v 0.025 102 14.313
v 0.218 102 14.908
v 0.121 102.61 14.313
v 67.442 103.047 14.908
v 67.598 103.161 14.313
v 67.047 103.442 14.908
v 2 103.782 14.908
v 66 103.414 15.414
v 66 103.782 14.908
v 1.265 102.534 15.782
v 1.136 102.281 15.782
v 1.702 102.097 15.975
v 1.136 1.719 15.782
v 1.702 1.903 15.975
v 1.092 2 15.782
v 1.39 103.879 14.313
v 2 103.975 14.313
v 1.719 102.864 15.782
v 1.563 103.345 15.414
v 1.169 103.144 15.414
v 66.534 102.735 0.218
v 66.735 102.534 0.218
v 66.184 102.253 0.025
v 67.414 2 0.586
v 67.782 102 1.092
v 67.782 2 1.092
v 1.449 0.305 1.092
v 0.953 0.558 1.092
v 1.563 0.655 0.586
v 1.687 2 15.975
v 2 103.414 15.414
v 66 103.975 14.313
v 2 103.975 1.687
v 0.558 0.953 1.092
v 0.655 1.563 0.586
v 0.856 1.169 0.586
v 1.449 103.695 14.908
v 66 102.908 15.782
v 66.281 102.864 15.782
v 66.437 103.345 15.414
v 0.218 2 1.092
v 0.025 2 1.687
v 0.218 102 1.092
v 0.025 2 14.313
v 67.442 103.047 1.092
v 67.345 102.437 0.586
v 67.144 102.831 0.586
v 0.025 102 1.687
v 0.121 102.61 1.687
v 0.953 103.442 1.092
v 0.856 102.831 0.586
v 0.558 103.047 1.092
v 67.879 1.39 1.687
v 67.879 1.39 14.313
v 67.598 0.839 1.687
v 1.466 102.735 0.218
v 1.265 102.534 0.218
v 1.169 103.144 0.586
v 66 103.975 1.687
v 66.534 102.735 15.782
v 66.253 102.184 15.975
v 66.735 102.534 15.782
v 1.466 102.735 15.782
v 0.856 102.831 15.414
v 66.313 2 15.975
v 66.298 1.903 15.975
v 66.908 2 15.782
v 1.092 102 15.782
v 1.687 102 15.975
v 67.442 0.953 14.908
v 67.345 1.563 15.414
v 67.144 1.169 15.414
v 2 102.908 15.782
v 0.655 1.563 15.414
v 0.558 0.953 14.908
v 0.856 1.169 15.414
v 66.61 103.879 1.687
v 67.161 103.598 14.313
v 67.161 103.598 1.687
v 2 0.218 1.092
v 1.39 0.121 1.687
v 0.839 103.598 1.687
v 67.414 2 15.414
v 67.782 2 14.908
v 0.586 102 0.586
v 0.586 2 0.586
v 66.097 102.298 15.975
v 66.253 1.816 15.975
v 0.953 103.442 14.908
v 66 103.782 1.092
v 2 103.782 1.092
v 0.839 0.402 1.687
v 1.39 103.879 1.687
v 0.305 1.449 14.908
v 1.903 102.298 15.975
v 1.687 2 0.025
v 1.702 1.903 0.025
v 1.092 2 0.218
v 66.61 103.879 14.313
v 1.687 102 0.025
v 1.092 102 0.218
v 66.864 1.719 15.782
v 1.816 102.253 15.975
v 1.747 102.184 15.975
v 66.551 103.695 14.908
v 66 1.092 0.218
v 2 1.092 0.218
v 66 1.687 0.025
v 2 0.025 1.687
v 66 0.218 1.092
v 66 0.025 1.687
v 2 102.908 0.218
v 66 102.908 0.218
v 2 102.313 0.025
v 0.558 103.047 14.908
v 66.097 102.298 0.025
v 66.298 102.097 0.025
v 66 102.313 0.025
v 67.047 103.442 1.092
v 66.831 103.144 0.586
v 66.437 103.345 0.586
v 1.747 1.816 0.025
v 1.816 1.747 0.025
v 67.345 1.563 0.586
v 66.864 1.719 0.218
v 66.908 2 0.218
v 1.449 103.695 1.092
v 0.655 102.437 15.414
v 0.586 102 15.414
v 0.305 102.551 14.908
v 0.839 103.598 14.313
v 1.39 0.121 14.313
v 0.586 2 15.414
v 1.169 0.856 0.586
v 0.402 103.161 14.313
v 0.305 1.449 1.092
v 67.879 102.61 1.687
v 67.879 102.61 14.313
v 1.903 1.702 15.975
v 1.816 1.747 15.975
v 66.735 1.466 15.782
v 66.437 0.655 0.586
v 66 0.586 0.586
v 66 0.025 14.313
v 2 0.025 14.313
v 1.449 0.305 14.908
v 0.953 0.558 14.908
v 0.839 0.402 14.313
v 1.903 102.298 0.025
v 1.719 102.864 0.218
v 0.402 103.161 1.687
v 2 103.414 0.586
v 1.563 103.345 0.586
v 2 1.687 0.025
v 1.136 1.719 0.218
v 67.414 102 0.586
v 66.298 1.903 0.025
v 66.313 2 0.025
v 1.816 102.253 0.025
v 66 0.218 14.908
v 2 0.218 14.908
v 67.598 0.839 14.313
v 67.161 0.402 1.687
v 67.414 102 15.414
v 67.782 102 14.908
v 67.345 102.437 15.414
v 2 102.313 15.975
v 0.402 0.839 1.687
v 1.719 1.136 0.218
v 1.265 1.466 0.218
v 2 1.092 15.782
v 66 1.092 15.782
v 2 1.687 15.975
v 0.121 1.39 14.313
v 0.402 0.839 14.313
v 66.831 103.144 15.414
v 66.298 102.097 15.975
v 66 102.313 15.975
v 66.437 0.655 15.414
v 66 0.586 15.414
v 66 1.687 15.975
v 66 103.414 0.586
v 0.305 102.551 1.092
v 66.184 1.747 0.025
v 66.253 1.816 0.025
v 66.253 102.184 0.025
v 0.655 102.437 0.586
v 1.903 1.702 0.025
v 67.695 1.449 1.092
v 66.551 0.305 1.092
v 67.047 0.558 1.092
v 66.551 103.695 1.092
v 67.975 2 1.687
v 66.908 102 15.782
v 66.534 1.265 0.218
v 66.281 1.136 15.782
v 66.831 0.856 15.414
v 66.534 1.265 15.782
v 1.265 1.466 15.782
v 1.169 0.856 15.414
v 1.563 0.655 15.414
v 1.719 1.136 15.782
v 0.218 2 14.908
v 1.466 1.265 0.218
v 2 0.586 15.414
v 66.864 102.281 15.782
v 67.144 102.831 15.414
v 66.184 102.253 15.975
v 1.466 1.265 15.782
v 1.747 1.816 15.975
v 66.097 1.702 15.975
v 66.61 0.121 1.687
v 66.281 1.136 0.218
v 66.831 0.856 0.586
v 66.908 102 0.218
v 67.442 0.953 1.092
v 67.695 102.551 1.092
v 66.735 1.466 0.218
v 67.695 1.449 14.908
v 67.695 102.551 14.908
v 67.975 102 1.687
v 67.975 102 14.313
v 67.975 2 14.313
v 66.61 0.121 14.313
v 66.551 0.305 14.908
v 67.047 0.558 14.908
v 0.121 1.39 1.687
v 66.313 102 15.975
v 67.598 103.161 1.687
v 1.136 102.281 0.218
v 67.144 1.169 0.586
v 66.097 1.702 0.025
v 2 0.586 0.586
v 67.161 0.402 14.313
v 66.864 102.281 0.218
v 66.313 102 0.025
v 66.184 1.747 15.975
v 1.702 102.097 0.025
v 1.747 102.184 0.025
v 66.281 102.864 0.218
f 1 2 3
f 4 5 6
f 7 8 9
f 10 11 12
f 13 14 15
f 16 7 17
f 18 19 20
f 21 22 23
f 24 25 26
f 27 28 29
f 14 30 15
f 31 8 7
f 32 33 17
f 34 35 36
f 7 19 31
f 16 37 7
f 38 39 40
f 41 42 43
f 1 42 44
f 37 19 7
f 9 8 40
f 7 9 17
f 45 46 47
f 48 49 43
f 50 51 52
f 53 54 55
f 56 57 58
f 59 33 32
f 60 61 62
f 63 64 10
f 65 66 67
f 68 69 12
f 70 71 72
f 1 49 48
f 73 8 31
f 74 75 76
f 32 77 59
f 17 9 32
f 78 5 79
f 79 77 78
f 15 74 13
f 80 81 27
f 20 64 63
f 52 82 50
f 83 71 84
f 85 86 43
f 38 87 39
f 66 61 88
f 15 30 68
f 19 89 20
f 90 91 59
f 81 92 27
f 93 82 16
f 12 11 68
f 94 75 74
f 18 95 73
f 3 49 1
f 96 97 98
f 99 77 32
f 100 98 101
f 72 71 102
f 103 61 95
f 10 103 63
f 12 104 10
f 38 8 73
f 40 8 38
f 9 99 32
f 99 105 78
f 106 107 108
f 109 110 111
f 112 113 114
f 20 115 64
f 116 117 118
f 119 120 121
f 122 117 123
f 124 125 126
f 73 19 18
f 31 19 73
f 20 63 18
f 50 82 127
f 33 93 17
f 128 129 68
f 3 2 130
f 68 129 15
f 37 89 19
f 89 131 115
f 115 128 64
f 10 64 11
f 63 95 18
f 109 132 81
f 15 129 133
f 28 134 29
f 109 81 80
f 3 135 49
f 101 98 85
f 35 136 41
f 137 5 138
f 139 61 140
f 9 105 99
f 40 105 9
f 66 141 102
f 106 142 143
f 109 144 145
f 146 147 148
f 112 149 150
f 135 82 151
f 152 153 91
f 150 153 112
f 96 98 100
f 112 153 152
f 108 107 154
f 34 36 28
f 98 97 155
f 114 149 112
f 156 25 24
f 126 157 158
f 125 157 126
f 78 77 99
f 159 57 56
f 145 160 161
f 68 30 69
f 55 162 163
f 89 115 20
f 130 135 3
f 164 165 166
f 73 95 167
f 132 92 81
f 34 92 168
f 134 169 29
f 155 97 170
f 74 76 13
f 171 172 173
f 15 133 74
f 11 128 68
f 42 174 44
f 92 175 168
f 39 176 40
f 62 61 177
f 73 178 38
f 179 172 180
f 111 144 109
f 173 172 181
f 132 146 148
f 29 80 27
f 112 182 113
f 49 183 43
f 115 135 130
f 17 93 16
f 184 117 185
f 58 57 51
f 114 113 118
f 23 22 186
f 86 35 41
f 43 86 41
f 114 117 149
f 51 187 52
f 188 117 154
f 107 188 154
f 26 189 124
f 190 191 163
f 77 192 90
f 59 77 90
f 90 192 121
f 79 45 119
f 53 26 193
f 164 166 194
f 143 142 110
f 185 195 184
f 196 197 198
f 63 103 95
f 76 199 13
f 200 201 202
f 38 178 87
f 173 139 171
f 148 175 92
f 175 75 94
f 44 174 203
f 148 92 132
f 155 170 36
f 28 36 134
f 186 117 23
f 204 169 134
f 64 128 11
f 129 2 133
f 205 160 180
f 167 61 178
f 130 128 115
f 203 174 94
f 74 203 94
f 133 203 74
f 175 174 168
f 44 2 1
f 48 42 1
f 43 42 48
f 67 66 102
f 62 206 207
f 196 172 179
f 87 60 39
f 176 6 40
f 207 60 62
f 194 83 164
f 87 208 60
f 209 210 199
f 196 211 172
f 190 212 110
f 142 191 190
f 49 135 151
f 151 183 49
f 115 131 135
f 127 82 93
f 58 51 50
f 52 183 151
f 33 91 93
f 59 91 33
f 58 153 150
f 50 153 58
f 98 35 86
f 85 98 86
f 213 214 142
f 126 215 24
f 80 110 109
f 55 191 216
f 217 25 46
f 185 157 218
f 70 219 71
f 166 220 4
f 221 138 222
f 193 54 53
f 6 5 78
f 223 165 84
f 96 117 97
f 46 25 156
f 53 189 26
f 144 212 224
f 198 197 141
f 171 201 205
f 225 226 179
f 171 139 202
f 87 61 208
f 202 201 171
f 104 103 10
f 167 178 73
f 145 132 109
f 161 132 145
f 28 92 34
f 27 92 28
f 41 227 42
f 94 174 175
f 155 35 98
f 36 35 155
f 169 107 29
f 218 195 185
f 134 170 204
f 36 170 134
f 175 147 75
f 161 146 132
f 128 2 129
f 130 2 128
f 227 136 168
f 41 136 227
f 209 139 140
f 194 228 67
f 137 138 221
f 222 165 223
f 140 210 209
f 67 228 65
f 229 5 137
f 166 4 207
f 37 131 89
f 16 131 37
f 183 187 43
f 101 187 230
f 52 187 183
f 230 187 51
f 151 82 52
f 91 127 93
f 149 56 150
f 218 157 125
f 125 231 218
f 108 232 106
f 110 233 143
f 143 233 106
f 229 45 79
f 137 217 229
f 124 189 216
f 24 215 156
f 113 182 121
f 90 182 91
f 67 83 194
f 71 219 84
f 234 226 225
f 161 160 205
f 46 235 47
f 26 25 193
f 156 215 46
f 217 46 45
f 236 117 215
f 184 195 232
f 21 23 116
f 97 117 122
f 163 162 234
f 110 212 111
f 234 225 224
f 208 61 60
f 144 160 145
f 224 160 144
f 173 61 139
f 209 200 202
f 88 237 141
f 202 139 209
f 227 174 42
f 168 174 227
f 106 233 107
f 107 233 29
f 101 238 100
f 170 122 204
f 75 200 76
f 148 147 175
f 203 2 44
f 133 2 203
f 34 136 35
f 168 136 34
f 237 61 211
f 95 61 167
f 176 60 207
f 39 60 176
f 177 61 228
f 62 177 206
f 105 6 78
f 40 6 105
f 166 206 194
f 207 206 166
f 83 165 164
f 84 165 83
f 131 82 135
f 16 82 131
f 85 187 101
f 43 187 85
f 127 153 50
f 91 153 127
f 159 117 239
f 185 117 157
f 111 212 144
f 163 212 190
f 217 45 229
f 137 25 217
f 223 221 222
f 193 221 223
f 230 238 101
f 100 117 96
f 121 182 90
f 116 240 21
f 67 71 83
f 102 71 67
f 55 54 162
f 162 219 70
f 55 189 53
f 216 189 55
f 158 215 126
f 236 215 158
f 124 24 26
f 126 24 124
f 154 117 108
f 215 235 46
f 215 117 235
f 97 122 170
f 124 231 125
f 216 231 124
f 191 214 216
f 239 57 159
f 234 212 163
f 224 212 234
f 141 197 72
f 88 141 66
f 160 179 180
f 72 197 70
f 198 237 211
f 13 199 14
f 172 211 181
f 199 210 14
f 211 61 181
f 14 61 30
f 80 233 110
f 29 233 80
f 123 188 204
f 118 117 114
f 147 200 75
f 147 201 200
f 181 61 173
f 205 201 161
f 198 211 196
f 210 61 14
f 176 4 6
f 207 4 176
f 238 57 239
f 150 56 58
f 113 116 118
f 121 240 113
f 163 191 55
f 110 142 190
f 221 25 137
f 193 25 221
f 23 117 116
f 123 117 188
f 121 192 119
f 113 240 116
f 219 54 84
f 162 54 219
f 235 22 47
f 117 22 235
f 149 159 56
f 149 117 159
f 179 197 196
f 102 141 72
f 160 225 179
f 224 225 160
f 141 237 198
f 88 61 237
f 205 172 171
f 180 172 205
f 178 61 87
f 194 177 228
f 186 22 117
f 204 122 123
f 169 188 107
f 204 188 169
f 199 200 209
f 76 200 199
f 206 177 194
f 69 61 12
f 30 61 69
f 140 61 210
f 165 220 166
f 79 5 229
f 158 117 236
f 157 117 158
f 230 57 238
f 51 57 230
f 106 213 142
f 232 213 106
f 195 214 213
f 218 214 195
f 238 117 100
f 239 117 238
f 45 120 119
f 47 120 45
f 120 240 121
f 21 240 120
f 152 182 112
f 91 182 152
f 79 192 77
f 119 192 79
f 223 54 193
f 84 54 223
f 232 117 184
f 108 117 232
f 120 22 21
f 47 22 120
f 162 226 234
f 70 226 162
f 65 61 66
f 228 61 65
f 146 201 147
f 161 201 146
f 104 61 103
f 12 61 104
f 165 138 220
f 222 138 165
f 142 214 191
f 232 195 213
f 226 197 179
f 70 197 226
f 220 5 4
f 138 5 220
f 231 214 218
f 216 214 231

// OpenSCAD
bw = 64;
bl = 100;
bh = 12;

bxh = 30;
bxw = 70;
bxl = 100;

cr = 2;

$fn = 20;
/*
minkowski() {
    translate([cr,cr,cr]) sphere(r = cr);
    translate([cr,cr,cr]) cube([bw,bl,bh]);
}
*/

minkowski() {
    translate([cr,cr,cr]) sphere(r = cr);
    cube([bw,bl,bh]);
}
